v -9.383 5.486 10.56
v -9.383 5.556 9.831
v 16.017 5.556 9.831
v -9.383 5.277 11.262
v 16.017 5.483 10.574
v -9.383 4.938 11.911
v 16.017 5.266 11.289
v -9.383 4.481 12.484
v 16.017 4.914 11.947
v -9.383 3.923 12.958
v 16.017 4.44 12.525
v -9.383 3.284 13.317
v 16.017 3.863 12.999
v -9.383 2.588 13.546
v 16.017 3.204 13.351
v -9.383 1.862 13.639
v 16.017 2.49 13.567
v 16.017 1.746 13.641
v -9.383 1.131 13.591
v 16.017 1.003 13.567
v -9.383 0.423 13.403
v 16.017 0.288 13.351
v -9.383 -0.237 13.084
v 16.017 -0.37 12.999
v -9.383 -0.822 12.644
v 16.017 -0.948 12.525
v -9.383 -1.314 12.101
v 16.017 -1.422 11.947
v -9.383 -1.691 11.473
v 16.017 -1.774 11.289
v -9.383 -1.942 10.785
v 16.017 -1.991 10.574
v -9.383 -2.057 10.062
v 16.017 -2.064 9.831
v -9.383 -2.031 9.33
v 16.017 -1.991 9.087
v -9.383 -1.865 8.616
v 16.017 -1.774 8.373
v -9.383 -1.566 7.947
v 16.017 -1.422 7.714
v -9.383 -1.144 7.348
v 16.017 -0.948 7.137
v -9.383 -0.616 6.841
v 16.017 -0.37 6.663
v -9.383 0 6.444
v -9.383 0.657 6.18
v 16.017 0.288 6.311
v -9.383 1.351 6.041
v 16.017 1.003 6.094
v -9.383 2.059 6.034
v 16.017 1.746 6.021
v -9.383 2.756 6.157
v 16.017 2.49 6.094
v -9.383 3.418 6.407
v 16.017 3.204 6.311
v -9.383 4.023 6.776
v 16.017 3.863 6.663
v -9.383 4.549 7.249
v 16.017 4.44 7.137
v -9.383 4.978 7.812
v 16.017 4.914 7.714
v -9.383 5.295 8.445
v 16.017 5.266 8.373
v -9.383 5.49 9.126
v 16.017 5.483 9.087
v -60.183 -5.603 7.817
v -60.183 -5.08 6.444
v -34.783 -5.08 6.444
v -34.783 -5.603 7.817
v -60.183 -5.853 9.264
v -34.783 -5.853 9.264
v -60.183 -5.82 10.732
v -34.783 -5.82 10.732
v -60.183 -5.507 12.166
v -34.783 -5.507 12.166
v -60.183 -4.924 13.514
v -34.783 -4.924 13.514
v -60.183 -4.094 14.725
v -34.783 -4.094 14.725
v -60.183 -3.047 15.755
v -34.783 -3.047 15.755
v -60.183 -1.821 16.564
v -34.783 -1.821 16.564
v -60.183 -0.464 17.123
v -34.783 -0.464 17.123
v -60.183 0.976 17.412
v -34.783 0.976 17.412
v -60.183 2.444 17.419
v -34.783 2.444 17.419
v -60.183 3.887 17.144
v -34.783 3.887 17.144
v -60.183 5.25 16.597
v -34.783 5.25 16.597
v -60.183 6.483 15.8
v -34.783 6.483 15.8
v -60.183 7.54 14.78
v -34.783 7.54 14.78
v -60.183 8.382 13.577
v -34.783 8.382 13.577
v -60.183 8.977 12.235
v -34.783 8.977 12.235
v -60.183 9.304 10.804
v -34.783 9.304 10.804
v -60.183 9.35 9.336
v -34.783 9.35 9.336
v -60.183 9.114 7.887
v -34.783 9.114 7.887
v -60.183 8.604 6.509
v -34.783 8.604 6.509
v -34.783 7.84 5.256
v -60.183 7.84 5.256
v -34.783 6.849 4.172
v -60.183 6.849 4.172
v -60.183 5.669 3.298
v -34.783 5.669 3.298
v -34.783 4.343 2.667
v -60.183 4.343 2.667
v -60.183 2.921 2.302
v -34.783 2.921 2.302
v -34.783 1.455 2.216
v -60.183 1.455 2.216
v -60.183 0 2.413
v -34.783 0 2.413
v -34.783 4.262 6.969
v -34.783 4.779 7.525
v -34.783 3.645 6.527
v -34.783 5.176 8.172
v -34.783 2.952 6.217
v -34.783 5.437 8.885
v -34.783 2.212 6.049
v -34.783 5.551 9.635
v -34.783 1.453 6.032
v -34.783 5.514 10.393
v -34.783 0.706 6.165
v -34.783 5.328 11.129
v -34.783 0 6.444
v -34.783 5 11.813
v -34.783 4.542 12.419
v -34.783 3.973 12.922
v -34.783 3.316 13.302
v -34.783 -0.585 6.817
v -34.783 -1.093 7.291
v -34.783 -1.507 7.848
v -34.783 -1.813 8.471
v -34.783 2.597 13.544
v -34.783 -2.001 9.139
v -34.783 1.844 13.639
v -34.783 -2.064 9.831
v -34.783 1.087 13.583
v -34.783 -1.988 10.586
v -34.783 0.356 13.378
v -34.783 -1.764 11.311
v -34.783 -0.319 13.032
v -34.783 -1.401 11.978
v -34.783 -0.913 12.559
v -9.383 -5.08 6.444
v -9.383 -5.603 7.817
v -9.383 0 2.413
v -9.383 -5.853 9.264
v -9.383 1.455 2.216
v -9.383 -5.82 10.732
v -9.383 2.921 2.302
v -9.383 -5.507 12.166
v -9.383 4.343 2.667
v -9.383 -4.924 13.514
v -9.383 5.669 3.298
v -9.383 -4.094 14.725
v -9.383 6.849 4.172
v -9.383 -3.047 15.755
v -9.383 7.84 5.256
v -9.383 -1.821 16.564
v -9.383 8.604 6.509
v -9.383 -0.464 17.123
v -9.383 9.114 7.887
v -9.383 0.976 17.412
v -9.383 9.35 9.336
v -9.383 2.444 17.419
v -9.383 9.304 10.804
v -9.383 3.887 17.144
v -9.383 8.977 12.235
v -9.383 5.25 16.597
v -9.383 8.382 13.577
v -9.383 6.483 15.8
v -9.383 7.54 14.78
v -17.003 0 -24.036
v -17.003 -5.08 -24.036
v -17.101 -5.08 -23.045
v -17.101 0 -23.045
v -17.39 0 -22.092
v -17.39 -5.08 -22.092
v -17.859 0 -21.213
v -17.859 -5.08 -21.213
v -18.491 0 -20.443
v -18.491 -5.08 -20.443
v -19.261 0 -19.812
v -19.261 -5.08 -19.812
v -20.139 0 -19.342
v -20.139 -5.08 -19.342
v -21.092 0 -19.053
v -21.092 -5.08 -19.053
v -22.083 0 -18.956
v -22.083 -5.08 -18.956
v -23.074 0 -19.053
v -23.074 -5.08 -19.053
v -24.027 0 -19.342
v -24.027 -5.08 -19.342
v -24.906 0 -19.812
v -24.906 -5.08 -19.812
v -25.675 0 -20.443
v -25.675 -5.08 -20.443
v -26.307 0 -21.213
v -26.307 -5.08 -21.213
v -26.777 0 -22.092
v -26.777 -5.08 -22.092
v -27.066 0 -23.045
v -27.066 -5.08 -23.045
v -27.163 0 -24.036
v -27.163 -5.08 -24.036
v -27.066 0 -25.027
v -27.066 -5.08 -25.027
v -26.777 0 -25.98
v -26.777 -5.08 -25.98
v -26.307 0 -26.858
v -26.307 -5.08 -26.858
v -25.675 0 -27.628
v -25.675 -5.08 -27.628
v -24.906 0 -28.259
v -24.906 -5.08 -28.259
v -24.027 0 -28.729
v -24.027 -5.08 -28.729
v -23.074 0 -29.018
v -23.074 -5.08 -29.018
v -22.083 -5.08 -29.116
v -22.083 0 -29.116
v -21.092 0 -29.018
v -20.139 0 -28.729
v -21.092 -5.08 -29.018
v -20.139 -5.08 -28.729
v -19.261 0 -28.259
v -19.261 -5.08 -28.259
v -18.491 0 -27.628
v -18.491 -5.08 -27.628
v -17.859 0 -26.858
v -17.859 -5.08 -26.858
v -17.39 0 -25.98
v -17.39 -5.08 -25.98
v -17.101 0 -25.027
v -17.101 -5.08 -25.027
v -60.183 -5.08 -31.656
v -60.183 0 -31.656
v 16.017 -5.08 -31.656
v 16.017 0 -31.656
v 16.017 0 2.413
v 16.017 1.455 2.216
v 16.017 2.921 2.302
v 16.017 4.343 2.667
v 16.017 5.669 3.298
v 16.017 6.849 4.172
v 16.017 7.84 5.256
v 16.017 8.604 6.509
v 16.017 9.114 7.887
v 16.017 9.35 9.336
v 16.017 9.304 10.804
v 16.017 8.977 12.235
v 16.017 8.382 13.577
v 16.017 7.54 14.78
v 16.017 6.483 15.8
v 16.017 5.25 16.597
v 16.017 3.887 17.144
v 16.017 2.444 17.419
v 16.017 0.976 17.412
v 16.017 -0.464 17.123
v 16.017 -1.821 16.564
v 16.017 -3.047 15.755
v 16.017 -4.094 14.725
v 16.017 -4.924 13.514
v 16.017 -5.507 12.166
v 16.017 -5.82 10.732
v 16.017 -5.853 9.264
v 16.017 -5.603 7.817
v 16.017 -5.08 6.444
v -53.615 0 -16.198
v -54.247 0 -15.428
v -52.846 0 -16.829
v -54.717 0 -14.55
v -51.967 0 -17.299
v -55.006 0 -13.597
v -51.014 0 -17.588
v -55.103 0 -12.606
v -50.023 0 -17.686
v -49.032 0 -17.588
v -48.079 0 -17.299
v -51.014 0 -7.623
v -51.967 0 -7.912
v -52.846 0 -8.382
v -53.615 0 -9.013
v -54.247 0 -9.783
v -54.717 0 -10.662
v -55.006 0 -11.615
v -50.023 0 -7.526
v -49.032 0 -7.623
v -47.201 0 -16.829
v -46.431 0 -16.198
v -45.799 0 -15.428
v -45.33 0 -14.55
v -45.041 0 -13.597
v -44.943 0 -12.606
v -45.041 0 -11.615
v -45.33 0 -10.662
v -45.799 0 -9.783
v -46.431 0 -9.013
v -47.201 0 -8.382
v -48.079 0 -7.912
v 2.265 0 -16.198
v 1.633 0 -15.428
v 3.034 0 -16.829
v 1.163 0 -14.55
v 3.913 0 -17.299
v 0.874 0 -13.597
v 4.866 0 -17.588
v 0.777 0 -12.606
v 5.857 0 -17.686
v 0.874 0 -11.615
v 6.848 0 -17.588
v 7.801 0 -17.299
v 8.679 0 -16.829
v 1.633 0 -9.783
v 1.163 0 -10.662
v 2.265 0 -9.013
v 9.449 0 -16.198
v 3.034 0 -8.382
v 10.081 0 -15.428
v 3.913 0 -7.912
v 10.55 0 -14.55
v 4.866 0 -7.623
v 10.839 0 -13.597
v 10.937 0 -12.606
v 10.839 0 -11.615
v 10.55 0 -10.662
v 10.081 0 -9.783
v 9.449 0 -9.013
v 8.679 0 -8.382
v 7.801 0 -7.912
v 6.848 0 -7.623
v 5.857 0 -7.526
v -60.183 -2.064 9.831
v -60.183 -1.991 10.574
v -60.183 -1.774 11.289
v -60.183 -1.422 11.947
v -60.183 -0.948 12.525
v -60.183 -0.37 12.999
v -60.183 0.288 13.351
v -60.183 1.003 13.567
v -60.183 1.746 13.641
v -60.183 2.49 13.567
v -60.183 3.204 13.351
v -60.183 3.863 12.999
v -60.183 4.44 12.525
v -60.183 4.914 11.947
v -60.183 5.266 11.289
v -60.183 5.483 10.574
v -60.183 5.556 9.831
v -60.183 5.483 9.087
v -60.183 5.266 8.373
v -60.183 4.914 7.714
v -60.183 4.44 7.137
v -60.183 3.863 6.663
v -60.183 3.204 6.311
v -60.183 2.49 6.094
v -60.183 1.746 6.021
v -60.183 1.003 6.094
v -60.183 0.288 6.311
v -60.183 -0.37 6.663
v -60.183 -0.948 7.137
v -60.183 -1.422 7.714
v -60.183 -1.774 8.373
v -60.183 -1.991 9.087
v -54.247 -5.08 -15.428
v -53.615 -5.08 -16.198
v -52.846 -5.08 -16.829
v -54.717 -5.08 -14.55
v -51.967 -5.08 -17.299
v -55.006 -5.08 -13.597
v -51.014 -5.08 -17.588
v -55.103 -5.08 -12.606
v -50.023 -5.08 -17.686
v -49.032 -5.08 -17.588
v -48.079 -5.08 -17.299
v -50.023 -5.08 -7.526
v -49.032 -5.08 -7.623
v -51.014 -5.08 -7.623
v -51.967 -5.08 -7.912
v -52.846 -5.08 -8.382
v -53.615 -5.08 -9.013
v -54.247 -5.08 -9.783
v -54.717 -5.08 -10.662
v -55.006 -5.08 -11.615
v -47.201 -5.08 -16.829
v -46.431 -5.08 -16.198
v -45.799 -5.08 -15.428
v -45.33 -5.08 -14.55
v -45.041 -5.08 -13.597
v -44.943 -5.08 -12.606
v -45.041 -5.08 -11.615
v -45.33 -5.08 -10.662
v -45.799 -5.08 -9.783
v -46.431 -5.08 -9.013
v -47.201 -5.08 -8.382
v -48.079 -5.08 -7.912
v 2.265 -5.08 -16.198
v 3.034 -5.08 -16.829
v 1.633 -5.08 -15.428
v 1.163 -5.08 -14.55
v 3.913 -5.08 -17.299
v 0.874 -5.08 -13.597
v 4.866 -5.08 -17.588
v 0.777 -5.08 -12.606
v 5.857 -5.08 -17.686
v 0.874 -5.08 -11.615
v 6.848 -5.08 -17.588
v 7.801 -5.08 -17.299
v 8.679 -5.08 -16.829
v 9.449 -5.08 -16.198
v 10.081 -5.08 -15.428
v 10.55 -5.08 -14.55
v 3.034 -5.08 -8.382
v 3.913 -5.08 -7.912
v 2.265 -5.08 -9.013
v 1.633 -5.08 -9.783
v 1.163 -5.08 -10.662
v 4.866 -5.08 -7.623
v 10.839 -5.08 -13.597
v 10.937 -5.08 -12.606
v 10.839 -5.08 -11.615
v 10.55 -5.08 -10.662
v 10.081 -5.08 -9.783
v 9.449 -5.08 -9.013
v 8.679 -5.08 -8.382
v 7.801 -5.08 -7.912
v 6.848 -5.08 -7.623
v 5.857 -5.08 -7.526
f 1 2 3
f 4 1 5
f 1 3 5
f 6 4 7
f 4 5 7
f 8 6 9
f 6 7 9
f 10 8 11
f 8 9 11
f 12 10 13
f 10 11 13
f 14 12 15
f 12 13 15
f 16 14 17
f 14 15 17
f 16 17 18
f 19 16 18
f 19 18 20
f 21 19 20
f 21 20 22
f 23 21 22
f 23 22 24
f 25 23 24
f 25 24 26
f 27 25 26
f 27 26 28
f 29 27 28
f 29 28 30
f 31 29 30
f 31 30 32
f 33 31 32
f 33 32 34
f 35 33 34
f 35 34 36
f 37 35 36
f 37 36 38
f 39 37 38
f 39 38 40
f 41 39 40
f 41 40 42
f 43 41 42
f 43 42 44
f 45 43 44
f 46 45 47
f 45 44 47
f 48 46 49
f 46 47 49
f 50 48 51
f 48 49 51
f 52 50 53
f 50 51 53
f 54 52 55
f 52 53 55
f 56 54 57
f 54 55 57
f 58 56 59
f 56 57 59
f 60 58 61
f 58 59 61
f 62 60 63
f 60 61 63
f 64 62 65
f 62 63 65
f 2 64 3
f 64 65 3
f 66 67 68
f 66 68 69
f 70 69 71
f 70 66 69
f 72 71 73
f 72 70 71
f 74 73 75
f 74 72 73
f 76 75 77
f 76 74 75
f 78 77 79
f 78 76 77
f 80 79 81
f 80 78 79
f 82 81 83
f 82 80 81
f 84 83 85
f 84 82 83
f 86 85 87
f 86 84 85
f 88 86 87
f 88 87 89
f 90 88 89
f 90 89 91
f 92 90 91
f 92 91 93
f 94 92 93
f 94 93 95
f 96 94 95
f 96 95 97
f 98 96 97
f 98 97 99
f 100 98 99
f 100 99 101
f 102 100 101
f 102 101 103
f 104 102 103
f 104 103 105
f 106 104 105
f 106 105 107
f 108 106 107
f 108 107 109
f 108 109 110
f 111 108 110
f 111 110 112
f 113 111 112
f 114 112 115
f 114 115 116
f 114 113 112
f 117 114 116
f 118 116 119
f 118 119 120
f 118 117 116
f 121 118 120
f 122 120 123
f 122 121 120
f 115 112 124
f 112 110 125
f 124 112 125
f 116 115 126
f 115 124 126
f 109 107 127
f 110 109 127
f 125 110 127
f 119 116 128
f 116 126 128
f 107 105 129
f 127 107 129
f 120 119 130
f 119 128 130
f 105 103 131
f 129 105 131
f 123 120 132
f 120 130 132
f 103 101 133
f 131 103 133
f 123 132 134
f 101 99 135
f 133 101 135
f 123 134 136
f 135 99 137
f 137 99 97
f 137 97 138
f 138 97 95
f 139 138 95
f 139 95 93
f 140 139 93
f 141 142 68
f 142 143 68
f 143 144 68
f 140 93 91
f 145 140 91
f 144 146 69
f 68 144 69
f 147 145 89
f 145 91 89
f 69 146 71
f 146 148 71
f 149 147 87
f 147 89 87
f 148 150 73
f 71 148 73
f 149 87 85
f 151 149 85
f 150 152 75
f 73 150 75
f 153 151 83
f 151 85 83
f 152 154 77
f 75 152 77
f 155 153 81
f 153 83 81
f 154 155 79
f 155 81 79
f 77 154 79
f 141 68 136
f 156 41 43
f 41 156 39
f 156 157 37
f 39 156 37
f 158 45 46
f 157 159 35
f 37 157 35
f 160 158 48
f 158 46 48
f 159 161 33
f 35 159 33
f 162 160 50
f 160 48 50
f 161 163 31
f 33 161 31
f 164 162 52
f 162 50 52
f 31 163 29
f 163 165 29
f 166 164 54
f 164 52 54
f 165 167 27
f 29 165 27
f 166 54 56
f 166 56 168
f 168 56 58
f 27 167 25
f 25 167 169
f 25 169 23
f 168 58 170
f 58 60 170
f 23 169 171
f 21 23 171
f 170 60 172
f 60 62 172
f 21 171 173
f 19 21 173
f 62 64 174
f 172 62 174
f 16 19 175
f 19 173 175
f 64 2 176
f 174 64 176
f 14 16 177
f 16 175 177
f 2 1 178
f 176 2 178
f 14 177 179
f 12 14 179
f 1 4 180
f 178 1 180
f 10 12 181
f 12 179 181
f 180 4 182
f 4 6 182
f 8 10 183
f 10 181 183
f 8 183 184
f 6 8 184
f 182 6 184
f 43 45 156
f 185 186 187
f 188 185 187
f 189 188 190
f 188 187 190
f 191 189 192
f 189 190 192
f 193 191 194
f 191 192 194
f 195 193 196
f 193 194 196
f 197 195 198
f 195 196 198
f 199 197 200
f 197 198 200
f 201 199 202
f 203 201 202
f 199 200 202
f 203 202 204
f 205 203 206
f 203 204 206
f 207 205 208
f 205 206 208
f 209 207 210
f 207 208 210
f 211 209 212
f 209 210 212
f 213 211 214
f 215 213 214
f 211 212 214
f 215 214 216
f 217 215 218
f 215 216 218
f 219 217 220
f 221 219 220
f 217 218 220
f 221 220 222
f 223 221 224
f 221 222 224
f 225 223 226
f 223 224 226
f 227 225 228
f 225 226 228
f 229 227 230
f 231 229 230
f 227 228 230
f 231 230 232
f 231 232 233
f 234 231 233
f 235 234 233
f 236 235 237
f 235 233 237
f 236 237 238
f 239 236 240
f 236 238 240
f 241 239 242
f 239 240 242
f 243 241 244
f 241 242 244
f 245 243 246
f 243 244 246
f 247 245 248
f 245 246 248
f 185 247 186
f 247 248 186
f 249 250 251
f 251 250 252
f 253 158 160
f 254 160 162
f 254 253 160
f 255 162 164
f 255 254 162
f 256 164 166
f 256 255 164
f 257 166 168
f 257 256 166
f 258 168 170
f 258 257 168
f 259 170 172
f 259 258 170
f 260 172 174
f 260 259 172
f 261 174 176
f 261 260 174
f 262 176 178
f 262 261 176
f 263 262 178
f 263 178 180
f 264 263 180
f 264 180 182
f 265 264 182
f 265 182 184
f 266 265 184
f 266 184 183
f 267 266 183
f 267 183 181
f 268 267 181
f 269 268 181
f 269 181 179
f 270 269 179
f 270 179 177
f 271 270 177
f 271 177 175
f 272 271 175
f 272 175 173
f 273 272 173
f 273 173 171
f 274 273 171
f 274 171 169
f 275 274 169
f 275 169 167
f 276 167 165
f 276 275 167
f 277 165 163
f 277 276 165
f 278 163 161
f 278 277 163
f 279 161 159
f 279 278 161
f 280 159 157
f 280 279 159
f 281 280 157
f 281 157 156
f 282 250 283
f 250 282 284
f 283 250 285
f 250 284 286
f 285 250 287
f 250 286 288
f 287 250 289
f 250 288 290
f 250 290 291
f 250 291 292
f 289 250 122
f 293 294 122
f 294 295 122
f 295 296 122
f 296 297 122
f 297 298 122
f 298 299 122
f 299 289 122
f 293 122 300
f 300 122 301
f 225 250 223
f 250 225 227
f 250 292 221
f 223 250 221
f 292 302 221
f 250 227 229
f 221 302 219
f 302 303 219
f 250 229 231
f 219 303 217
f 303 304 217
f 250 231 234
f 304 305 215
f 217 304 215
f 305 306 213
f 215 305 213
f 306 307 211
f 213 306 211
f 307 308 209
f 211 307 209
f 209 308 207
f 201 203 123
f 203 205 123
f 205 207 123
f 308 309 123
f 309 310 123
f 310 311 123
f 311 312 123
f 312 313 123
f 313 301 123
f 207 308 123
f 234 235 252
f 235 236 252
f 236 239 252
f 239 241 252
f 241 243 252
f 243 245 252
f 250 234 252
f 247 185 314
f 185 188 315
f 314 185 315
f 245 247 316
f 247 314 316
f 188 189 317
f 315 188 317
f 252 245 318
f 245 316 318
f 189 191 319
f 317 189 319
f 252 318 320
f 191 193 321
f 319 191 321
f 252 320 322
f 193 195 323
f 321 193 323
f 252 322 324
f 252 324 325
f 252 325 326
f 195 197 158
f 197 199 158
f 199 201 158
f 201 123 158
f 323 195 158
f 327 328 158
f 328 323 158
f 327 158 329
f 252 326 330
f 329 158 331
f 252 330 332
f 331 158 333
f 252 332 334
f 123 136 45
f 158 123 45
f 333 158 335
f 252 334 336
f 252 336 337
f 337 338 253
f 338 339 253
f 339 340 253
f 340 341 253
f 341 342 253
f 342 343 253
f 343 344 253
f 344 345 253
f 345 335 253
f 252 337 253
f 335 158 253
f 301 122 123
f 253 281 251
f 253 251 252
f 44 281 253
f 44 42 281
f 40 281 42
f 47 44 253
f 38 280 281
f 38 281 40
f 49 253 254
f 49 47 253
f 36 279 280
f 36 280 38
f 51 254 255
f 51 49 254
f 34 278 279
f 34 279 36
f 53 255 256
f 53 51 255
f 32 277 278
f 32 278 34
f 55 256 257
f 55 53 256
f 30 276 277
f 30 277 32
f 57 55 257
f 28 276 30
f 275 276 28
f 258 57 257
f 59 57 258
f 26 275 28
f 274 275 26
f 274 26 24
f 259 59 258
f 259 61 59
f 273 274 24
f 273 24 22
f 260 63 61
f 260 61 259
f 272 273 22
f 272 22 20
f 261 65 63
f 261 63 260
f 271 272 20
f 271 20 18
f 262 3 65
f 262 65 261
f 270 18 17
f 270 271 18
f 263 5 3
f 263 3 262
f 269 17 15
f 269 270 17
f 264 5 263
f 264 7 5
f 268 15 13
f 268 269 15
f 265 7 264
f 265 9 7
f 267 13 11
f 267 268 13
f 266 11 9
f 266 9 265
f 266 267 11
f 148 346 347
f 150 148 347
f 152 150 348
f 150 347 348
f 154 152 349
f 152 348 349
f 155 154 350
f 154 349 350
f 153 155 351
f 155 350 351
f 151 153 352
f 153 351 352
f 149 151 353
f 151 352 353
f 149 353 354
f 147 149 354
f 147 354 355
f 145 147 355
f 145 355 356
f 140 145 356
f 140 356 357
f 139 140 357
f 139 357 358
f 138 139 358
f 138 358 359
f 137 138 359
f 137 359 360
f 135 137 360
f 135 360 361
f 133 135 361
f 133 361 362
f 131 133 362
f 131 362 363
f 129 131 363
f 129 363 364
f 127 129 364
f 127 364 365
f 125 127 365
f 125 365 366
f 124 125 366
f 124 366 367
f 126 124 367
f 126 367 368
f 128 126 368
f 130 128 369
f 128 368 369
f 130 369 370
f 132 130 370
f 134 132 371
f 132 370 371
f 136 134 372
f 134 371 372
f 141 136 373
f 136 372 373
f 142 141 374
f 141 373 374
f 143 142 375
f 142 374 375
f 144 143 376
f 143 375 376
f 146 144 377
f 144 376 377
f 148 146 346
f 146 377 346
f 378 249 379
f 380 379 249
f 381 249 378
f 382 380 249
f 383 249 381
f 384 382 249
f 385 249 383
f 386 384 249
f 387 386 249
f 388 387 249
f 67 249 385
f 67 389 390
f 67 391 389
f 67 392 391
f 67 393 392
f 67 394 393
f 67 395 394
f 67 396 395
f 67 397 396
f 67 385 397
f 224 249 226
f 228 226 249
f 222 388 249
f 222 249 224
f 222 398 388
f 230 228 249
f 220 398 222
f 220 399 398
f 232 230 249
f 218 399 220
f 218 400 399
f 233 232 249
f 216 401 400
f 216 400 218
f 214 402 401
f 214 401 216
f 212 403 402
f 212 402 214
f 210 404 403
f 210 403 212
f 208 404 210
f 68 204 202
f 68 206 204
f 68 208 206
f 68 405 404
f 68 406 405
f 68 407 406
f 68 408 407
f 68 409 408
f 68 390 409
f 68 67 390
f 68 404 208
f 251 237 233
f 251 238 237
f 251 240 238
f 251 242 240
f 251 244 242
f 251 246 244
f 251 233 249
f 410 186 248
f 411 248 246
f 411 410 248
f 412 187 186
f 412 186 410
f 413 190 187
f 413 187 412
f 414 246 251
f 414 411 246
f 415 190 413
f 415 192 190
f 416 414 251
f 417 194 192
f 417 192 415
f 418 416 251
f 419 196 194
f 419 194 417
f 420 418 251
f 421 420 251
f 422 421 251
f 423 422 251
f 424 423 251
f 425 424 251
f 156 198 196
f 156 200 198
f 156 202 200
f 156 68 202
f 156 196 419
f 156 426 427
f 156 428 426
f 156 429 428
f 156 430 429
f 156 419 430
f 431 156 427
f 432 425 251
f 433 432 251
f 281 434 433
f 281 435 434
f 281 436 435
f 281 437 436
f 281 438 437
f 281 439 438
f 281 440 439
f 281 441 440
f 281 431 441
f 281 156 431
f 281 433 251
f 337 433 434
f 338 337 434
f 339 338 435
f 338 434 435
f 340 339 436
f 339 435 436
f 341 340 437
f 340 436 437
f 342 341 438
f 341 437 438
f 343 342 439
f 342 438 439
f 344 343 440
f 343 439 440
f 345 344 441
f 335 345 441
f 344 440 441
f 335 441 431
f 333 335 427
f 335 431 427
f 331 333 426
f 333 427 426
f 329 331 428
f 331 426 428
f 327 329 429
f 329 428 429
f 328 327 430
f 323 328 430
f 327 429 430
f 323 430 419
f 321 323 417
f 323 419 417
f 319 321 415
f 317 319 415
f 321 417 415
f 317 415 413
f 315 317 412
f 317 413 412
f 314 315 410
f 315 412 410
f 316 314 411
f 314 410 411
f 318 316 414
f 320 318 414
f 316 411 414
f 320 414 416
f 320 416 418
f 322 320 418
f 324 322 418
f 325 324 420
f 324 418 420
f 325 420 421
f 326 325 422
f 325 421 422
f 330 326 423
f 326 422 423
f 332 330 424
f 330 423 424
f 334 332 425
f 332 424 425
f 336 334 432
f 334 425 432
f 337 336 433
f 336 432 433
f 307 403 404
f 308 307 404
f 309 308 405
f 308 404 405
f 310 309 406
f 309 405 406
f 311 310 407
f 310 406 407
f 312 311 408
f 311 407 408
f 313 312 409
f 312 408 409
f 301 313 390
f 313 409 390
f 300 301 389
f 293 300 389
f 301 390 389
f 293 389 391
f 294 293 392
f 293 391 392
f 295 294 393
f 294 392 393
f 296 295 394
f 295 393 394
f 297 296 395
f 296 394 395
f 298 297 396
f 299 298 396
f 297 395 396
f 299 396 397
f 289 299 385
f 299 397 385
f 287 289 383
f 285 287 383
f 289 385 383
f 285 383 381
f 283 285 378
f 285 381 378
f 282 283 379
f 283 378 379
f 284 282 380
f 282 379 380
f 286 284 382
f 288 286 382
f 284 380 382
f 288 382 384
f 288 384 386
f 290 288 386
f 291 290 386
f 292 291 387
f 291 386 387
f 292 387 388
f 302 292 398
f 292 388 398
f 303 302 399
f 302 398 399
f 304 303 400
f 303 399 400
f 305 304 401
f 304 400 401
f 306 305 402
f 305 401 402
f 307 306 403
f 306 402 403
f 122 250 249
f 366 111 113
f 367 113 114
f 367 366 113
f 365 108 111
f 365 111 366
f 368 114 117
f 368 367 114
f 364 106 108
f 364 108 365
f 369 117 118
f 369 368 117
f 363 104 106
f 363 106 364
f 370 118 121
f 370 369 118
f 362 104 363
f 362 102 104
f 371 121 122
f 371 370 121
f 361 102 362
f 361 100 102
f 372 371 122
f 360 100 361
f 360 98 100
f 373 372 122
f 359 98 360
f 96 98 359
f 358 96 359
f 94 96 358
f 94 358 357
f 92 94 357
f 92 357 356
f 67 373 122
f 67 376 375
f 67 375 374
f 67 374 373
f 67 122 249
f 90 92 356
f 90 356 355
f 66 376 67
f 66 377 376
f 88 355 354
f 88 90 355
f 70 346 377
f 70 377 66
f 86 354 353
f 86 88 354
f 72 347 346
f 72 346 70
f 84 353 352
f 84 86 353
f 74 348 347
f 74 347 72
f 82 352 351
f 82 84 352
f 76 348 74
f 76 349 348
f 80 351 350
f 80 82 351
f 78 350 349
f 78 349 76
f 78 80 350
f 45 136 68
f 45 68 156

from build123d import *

# Parameters (mm, degrees)
F0_W     = 76.2
F0_H     = 38.1
F1_DEPTH = 5.08
F2_R     = 7.62
F2_R_2   = 3.81
F3_DEPTH = 25.4
F4_R     = 7.62
F4_R_2   = 3.81
F5_DEPTH = 25.4
F6_R     = 5.08
F7_DEPTH = 5.08


# Not quite as in the source:
# - a feature names something its author has since deleted; it is built from what else it names


with BuildPart() as f1:
    # F0 (on Front) → F1 (new body)
    with BuildSketch(Plane.XZ):
        with Locations((-22.0833101058, -12.6055886477)):
            Rectangle(F0_W, F0_H)
    extrude(amount=F1_DEPTH)

    # F2 (on face) → F3 (join)
    with BuildSketch(Plane.YZ.offset(16.0166898942)):
        with Locations((1.74625, 9.8306645822)):
            Circle(F2_R)
        with Locations((1.74625, 9.8306645822)):
            Circle(F2_R_2, mode=Mode.SUBTRACT)
    extrude(amount=-F3_DEPTH)

    # F4 (on face) → F5 (join)
    with BuildSketch(Plane(origin=(-60.1833101058, 0, 0), x_dir=(0, -1, 0), z_dir=(-1, 0, 0))):
        with Locations((-1.74625, 9.8306645822)):
            Circle(F4_R)
        with Locations((-1.74625, 9.8306645822)):
            Circle(F4_R_2, mode=Mode.SUBTRACT)
    extrude(amount=-F5_DEPTH)

    # F6 (on face) → F7 (cut, through all)
    with BuildSketch(Plane.XZ.offset(5.08)):
        with Locations((-50.0233101058, -12.6055886477)):
            Circle(F6_R)
        with Locations((-22.0833101058, -24.0355886477)):
            Circle(F6_R)
        with Locations((5.8566898942, -12.6055886477)):
            Circle(F6_R)
    extrude(amount=-F7_DEPTH, mode=Mode.SUBTRACT)


solid = f1.part
